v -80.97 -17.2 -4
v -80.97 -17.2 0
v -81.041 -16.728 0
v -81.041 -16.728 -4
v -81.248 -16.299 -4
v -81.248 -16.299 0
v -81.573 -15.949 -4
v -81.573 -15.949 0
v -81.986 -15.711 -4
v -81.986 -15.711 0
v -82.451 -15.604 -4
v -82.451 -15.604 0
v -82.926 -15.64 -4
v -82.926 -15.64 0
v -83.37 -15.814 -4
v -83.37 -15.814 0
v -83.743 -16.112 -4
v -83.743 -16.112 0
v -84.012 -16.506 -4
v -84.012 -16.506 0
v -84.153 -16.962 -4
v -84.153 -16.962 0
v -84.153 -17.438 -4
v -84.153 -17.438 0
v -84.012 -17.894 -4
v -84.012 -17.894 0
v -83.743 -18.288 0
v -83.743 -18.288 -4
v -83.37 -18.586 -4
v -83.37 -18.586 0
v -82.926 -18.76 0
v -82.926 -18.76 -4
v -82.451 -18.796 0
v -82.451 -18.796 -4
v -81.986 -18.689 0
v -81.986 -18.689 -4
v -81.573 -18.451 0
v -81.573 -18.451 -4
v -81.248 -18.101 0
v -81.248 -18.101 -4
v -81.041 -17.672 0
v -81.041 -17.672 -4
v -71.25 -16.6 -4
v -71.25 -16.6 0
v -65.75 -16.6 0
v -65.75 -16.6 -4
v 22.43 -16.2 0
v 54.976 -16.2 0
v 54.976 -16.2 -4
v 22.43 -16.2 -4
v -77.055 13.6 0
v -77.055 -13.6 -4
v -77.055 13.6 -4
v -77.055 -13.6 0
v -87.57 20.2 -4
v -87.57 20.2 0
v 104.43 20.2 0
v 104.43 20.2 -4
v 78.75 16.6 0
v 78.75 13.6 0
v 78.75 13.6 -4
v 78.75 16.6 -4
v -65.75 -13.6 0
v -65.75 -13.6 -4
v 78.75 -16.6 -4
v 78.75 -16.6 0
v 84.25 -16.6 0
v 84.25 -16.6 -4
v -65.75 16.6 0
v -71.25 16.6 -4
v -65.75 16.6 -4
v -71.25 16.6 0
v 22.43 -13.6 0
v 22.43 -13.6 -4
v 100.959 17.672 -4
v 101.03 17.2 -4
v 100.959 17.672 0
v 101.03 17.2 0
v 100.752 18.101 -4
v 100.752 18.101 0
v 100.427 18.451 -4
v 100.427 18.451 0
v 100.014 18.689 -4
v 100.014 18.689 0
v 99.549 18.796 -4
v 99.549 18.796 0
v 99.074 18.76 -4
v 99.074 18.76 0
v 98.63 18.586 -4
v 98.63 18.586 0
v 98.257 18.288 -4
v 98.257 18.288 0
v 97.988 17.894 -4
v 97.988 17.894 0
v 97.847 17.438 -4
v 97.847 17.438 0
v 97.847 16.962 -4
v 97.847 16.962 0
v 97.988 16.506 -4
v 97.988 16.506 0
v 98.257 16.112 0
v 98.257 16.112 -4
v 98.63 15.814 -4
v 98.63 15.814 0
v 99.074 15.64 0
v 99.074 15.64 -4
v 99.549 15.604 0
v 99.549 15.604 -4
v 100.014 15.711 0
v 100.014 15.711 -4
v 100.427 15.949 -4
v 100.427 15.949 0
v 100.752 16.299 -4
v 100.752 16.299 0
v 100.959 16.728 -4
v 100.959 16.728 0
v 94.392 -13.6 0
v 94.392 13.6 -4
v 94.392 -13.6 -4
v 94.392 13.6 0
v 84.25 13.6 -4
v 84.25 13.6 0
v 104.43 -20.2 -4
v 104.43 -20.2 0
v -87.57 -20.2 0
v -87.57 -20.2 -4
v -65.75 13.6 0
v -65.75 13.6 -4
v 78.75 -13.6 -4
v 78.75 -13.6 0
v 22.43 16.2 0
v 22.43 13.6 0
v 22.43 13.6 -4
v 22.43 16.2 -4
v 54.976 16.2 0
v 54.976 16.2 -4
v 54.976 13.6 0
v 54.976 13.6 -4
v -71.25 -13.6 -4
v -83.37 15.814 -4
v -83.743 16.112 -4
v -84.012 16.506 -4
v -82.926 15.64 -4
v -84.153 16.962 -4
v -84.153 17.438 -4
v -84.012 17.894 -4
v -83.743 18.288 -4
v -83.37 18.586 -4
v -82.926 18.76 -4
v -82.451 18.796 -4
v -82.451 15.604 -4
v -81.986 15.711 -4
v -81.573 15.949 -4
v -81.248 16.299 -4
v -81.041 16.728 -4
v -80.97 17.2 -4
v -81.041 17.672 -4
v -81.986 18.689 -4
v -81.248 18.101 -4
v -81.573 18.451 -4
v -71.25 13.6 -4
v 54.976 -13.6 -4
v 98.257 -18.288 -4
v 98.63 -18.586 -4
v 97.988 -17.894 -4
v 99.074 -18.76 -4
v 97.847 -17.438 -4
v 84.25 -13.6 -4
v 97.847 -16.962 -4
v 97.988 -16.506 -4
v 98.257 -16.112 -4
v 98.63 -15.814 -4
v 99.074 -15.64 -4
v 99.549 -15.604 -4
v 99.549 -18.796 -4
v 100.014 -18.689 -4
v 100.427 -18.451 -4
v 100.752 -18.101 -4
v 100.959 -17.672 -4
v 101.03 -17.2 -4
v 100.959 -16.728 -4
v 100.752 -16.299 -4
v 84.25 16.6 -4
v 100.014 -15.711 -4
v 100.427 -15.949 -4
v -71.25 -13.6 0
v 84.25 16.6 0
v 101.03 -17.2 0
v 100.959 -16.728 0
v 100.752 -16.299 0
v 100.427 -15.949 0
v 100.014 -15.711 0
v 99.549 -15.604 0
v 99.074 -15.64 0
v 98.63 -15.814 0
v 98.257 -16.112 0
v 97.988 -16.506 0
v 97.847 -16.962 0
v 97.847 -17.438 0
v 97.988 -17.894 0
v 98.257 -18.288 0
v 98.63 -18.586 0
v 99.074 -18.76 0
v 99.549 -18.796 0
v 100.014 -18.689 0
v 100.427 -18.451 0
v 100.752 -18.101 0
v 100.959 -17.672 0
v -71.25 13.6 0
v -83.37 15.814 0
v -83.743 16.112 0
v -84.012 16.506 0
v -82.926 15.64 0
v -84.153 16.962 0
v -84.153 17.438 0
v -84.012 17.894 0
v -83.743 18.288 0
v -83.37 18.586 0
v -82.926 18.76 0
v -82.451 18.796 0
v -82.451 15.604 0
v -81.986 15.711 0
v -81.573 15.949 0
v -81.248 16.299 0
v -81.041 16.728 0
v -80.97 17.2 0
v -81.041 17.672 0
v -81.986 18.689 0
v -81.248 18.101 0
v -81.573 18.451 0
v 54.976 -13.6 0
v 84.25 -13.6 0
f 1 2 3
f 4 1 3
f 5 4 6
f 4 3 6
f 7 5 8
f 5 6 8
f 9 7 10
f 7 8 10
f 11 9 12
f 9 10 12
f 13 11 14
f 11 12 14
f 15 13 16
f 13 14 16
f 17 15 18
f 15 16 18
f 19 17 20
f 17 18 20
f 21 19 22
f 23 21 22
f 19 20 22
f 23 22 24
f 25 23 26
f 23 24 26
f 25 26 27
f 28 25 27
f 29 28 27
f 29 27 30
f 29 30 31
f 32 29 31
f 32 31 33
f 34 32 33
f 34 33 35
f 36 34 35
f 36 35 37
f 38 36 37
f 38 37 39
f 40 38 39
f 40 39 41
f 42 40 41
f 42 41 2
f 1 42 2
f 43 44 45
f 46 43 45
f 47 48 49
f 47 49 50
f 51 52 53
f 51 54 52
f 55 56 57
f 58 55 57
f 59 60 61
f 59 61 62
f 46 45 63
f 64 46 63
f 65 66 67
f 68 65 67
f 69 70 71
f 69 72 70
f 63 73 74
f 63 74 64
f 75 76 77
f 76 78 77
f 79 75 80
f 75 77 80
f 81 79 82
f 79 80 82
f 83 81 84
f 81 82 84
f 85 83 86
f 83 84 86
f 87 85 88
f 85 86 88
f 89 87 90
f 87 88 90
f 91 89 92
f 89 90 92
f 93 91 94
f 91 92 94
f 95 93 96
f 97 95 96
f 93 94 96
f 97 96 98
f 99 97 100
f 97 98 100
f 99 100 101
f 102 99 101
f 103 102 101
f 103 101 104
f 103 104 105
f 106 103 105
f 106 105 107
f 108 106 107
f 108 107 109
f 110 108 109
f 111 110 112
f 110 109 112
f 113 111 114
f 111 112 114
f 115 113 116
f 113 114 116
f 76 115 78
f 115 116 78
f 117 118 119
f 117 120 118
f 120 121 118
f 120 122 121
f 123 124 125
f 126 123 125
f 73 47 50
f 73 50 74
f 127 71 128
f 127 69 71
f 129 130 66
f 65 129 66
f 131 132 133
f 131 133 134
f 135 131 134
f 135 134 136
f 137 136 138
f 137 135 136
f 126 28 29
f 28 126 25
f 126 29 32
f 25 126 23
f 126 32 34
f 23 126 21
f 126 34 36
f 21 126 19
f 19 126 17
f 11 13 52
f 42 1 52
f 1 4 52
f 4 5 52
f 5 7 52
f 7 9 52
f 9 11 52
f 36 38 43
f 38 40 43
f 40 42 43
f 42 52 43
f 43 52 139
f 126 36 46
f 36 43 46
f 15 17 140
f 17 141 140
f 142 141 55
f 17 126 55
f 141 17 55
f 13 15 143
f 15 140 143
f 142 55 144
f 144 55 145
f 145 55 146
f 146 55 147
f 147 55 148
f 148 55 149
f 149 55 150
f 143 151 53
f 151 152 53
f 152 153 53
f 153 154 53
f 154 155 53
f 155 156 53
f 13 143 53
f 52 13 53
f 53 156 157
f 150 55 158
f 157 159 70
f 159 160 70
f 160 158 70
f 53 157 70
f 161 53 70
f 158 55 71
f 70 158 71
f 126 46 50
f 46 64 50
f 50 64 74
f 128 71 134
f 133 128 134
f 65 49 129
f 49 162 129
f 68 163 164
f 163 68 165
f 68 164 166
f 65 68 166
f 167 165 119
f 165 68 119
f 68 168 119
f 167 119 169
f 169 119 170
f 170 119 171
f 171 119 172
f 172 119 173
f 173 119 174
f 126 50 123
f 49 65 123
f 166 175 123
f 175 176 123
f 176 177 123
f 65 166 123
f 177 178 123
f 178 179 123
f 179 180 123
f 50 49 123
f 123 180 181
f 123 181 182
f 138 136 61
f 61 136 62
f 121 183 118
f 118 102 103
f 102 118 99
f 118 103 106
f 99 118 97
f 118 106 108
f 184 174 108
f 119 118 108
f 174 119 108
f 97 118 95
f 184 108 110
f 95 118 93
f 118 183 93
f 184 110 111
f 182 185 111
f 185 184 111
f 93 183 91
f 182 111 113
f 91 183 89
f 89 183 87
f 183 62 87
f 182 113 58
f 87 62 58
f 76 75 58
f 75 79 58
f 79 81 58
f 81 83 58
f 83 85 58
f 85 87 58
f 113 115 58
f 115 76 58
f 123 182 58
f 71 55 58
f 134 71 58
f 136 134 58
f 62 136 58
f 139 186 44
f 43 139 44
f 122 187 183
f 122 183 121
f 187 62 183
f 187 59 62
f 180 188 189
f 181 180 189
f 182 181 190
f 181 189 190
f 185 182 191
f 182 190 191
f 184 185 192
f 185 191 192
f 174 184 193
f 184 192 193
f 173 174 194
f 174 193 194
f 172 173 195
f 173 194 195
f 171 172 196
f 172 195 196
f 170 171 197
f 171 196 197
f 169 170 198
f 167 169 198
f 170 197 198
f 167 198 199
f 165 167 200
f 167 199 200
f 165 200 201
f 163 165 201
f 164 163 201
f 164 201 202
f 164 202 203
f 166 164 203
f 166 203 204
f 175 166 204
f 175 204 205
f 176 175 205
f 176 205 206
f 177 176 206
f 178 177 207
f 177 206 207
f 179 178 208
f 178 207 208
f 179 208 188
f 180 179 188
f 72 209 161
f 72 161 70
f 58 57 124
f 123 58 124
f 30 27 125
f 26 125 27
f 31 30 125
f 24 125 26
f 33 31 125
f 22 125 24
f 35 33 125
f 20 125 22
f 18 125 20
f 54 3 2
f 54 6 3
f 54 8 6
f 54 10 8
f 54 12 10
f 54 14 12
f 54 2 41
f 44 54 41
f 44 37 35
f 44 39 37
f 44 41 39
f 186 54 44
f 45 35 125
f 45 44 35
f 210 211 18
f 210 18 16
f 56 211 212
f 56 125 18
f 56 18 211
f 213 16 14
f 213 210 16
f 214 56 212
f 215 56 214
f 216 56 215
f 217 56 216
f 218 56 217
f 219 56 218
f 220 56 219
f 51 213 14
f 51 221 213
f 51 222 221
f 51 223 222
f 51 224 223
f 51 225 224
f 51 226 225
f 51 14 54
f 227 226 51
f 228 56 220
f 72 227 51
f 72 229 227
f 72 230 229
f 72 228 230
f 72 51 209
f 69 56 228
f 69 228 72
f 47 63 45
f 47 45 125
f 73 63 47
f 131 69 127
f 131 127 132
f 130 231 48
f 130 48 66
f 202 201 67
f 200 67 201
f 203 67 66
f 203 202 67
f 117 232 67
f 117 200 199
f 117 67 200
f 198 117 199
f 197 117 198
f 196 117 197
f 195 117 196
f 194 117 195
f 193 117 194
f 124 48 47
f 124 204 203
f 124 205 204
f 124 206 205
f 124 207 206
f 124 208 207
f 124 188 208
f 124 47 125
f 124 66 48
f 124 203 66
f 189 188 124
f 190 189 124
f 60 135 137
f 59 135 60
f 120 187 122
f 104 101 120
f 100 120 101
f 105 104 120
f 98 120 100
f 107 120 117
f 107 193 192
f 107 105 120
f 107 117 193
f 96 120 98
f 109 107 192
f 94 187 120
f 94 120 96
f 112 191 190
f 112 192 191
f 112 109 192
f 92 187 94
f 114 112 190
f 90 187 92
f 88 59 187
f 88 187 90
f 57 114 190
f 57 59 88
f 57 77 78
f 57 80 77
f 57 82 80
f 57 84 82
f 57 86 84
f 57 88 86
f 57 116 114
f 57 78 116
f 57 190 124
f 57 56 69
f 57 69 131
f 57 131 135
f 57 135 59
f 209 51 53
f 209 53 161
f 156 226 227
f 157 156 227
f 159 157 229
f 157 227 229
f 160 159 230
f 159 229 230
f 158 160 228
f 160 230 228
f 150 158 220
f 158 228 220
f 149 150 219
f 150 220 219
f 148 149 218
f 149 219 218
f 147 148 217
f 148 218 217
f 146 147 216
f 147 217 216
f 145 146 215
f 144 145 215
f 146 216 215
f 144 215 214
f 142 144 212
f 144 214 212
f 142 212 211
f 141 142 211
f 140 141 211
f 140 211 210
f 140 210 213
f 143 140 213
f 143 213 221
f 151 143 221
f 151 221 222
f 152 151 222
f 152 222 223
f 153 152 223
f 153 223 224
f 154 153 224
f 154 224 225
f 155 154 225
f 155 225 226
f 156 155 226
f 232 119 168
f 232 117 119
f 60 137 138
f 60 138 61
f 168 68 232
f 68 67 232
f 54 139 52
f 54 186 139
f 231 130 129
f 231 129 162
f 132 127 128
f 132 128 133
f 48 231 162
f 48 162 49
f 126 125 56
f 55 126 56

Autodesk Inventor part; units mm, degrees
ref_plane "YZ Plane" through (0, 0, 0) normal (1, 0, 0) x (0, 1, 0)
ref_plane "XZ Plane" through (0, 0, 0) normal (0, 1, 0) x (-1, 0, 0)
ref_plane "XY Plane" through (0, 0, 0) normal (0, 0, 1) x (1, 0, 0)
sketch "Sketch1" plane through (0, 0, 0) normal (0, 0, 1) x (1, 0, 0)
  line L0 (93.3916, -12.6) -> (93.3916, 12.6)
  line L1 (53.9763, -12.6) -> (93.3916, -12.6)
  line L2 (53.9763, -15.2) -> (53.9763, -12.6)
  line L3 (38.2753, -15.2) -> (53.9763, -15.2)
  line L4 (38.2753, -15.2) -> (23.4296, -15.2)
  line L5 (23.4296, -12.6) -> (23.4296, -15.2)
  line L6 (-76.0546, -12.6) -> (23.4296, -12.6)
  line L7 (23.4296, 12.6) -> (-76.0546, 12.6)
  line L8 (23.4296, 15.2) -> (23.4296, 12.6)
  line L9 (-76.0546, 12.6) -> (-76.0546, -12.6)
  line L10 (-70.1, 10) -> (-66.9, 10)
  line L11 (-66.9, -10) -> (-70.1, -10)
  line L12 (23.4296, 15.2) -> (53.9763, 15.2)
  line L13 (53.9763, 15.2) -> (53.9763, 12.6)
  line L14 (53.9763, 12.6) -> (93.3916, 12.6)
  line L15 (-77.0546, 13.6) -> (22.4296, 13.6)
  line L16 (22.4296, 13.6) -> (22.4296, 16.2)
  line L17 (22.4296, 16.2) -> (54.9763, 16.2)
  line L18 (54.9763, 16.2) -> (54.9763, 13.6)
  line L19 (54.9763, 13.6) -> (94.3916, 13.6)
  line L20 (94.3916, 13.6) -> (94.3916, -13.6)
  line L21 (94.3916, -13.6) -> (54.9763, -13.6)
  line L22 (54.9763, -13.6) -> (54.9763, -16.2)
  line L23 (54.9763, -16.2) -> (38.2753, -16.2)
  line L24 (38.2753, -16.2) -> (22.4296, -16.2)
  line L25 (22.4296, -16.2) -> (22.4296, -13.6)
  line L26 (22.4296, -13.6) -> (-77.0546, -13.6)
  line L27 (-77.0546, -13.6) -> (-77.0546, 13.6)
  line L28 (22.4296, -16.2) -> (22.4296, -20.2) construction
  line L29 (22.4296, -20.2) -> (-87.5704, -20.2)
  line L30 (-87.5704, -20.2) -> (-87.5704, 20.2)
  line L31 (-87.5704, 20.2) -> (22.4296, 20.2)
  line L32 (104.4296, -20.2) -> (22.4296, -20.2)
  line L33 (22.4296, 20.2) -> (104.4296, 20.2)
  line L34 (104.4296, 20.2) -> (104.4296, -20.2)
  circle A0 centre (-82.5704, 17.2) radius 1.6
  circle A1 centre (-82.5704, -17.2) radius 1.6
  circle A2 centre (99.4296, 17.2) radius 1.6
  circle A3 centre (99.4296, -17.2) radius 1.6
  dimension "d0" = 1
  dimension "d1" = 4
  dimension "d2" = 110
  dimension "d3" = 40.4
  dimension "d5" = 82
  dimension "d18" = 5
  dimension "d19" = 5
  dimension "d20" = 3
  dimension "d21" = 3
  dimension "d22" = 5
  dimension "d23" = 3
  dimension "d24" = 5
  dimension "d25" = 3
extrude "Extrusion1" add sketch "Sketch1" against normal blind 4 contours L29 L30 L31 L33 L34 L32
sketch "Sketch2" plane through (0, 0, 0) normal (0, 0, 1) x (1, 0, 0)
  line L0 (79.9, -10) -> (83.1, -10) construction
  line L1 (83.1, 10) -> (79.9, 10) construction
  line L2 (-66.9, -10) -> (-70.1, -10) construction
  line L3 (-70.1, 10) -> (-66.9, 10) construction
  line L4 (81.5, -10) -> (81.5, -13.6) construction
  line L5 (94.3916, -13.6) -> (54.9763, -13.6) projected
  line L6 (81.5, 10) -> (81.5, 13.6) construction
  line L7 (54.9763, 13.6) -> (94.3916, 13.6) projected
  line L8 (-68.5, -10) -> (-68.5, -13.6) construction
  line L9 (22.4296, -13.6) -> (-77.0546, -13.6) projected
  line L10 (-68.5, 10) -> (-68.5, 13.6) construction
  line L11 (-77.0546, 13.6) -> (22.4296, 13.6) projected
  line L12 (84.25, -10.6) -> (78.75, -10.6)
  line L13 (78.75, -10.6) -> (78.75, -16.6)
  line L14 (78.75, -16.6) -> (84.25, -16.6)
  line L15 (84.25, -16.6) -> (84.25, -10.6)
  line L16 (84.25, -10.6) -> (78.75, -16.6) construction
  line L17 (78.75, -10.6) -> (84.25, -16.6) construction
  line L18 (84.25, 10.6) -> (78.75, 10.6)
  line L19 (78.75, 10.6) -> (78.75, 16.6)
  line L20 (78.75, 16.6) -> (84.25, 16.6)
  line L21 (84.25, 16.6) -> (84.25, 10.6)
  line L22 (84.25, 10.6) -> (78.75, 16.6) construction
  line L23 (78.75, 10.6) -> (84.25, 16.6) construction
  line L24 (-65.75, 10.6) -> (-71.25, 10.6)
  line L25 (-71.25, 10.6) -> (-71.25, 16.6)
  line L26 (-71.25, 16.6) -> (-65.75, 16.6)
  line L27 (-65.75, 16.6) -> (-65.75, 10.6)
  line L28 (-65.75, 10.6) -> (-71.25, 16.6) construction
  line L29 (-71.25, 10.6) -> (-65.75, 16.6) construction
  line L30 (-65.75, -10.6) -> (-71.25, -10.6)
  line L31 (-71.25, -10.6) -> (-71.25, -16.6)
  line L32 (-71.25, -16.6) -> (-65.75, -16.6)
  line L33 (-65.75, -16.6) -> (-65.75, -10.6)
  line L34 (-65.75, -10.6) -> (-71.25, -16.6) construction
  line L35 (-71.25, -10.6) -> (-65.75, -16.6) construction
  point P0 (0, 0)
  point P1 (-71.25, 13.6)
  point P2 (-65.75, 13.6)
  point P3 (-65.75, -13.6)
  point P4 (-71.25, -13.6)
  point P5 (78.75, 13.6)
  point P6 (84.25, 13.6)
  point P7 (84.25, -13.6)
  point P8 (78.75, -13.6)
  dimension "d8" = 5.5
  dimension "d9" = 6
  dimension "d10" = 5.5
  dimension "d11" = 6
  dimension "d12" = 5.5
  dimension "d13" = 6
  dimension "d14" = 5.5
  dimension "d15" = 6
extrude "Extrusion2" cut sketch "Sketch2" against normal blind 4 contours L15 L14 L13 L5 | L19 L20 L21 L7 | L33 L32 L31 L9 | L25 L26 L27 L11
sketch "Sketch4" plane through (-71.25, 16.6, 0) normal (0, -1, 0) x (1, 0, 0)
  line L0 (0, 0) -> (0, -4) construction
  line L1 (5.5, -4) -> (0, -4) construction
  line L2 (150, -4) -> (5.5, -4) construction
  line L3 (155.5, -4) -> (150, -4) construction
  line L4 (169.1963, -4) -> (155.5, -4) construction
  line L5 (169.1963, 0) -> (169.1963, -4) construction
  line L6 (155.5, 0) -> (169.1963, 0) construction
  line L7 (155.5, -4) -> (155.5, 0) construction
  line L8 (0, 0) -> (5.5, 0) construction
  line L9 (-9.8372, 0) -> (0, 0) construction
  line L10 (-9.8372, -4) -> (-9.8372, 0) construction
  line L11 (0, -4) -> (-9.8372, -4) construction
  line L12 (5.5, -4) -> (5.5, 0) construction
  line L13 (150, 0) -> (150, -4) construction
  line L14 (5.5, 0) -> (150, 0) construction
  line L15 (150, 0) -> (155.5, 0) construction
  line L16 (175.6796, -4) -> (172.1628, -4) construction
  line L17 (172.1628, -4) -> (172.1628, 0) construction
  line L18 (172.1628, 0) -> (175.6796, 0) construction
  line L19 (175.6796, 0) -> (175.6796, -4) construction
  line L20 (-12.8037, -4) -> (-16.3204, -4) projected
  line L21 (-16.3204, -4) -> (-16.3204, 0) projected
  line L22 (-16.3204, 0) -> (-12.8037, 0) projected
  line L23 (-12.8037, 0) -> (-12.8037, -4) projected
  line L24 (0, 0) -> (5.5, 0) construction
  line L25 (2.75, 0) -> (2.75, -2.75) construction
  line L26 (150, 0) -> (155.5, 0) construction
  line L27 (152.75, 0) -> (152.75, -2.75) construction
  point P0 (71.25, 0)
  dimension "d26" = 2.75
  dimension "d27" = 2.75
properties part number "Template-Fixture-Mid" material "Polycarbonate, Clear"
